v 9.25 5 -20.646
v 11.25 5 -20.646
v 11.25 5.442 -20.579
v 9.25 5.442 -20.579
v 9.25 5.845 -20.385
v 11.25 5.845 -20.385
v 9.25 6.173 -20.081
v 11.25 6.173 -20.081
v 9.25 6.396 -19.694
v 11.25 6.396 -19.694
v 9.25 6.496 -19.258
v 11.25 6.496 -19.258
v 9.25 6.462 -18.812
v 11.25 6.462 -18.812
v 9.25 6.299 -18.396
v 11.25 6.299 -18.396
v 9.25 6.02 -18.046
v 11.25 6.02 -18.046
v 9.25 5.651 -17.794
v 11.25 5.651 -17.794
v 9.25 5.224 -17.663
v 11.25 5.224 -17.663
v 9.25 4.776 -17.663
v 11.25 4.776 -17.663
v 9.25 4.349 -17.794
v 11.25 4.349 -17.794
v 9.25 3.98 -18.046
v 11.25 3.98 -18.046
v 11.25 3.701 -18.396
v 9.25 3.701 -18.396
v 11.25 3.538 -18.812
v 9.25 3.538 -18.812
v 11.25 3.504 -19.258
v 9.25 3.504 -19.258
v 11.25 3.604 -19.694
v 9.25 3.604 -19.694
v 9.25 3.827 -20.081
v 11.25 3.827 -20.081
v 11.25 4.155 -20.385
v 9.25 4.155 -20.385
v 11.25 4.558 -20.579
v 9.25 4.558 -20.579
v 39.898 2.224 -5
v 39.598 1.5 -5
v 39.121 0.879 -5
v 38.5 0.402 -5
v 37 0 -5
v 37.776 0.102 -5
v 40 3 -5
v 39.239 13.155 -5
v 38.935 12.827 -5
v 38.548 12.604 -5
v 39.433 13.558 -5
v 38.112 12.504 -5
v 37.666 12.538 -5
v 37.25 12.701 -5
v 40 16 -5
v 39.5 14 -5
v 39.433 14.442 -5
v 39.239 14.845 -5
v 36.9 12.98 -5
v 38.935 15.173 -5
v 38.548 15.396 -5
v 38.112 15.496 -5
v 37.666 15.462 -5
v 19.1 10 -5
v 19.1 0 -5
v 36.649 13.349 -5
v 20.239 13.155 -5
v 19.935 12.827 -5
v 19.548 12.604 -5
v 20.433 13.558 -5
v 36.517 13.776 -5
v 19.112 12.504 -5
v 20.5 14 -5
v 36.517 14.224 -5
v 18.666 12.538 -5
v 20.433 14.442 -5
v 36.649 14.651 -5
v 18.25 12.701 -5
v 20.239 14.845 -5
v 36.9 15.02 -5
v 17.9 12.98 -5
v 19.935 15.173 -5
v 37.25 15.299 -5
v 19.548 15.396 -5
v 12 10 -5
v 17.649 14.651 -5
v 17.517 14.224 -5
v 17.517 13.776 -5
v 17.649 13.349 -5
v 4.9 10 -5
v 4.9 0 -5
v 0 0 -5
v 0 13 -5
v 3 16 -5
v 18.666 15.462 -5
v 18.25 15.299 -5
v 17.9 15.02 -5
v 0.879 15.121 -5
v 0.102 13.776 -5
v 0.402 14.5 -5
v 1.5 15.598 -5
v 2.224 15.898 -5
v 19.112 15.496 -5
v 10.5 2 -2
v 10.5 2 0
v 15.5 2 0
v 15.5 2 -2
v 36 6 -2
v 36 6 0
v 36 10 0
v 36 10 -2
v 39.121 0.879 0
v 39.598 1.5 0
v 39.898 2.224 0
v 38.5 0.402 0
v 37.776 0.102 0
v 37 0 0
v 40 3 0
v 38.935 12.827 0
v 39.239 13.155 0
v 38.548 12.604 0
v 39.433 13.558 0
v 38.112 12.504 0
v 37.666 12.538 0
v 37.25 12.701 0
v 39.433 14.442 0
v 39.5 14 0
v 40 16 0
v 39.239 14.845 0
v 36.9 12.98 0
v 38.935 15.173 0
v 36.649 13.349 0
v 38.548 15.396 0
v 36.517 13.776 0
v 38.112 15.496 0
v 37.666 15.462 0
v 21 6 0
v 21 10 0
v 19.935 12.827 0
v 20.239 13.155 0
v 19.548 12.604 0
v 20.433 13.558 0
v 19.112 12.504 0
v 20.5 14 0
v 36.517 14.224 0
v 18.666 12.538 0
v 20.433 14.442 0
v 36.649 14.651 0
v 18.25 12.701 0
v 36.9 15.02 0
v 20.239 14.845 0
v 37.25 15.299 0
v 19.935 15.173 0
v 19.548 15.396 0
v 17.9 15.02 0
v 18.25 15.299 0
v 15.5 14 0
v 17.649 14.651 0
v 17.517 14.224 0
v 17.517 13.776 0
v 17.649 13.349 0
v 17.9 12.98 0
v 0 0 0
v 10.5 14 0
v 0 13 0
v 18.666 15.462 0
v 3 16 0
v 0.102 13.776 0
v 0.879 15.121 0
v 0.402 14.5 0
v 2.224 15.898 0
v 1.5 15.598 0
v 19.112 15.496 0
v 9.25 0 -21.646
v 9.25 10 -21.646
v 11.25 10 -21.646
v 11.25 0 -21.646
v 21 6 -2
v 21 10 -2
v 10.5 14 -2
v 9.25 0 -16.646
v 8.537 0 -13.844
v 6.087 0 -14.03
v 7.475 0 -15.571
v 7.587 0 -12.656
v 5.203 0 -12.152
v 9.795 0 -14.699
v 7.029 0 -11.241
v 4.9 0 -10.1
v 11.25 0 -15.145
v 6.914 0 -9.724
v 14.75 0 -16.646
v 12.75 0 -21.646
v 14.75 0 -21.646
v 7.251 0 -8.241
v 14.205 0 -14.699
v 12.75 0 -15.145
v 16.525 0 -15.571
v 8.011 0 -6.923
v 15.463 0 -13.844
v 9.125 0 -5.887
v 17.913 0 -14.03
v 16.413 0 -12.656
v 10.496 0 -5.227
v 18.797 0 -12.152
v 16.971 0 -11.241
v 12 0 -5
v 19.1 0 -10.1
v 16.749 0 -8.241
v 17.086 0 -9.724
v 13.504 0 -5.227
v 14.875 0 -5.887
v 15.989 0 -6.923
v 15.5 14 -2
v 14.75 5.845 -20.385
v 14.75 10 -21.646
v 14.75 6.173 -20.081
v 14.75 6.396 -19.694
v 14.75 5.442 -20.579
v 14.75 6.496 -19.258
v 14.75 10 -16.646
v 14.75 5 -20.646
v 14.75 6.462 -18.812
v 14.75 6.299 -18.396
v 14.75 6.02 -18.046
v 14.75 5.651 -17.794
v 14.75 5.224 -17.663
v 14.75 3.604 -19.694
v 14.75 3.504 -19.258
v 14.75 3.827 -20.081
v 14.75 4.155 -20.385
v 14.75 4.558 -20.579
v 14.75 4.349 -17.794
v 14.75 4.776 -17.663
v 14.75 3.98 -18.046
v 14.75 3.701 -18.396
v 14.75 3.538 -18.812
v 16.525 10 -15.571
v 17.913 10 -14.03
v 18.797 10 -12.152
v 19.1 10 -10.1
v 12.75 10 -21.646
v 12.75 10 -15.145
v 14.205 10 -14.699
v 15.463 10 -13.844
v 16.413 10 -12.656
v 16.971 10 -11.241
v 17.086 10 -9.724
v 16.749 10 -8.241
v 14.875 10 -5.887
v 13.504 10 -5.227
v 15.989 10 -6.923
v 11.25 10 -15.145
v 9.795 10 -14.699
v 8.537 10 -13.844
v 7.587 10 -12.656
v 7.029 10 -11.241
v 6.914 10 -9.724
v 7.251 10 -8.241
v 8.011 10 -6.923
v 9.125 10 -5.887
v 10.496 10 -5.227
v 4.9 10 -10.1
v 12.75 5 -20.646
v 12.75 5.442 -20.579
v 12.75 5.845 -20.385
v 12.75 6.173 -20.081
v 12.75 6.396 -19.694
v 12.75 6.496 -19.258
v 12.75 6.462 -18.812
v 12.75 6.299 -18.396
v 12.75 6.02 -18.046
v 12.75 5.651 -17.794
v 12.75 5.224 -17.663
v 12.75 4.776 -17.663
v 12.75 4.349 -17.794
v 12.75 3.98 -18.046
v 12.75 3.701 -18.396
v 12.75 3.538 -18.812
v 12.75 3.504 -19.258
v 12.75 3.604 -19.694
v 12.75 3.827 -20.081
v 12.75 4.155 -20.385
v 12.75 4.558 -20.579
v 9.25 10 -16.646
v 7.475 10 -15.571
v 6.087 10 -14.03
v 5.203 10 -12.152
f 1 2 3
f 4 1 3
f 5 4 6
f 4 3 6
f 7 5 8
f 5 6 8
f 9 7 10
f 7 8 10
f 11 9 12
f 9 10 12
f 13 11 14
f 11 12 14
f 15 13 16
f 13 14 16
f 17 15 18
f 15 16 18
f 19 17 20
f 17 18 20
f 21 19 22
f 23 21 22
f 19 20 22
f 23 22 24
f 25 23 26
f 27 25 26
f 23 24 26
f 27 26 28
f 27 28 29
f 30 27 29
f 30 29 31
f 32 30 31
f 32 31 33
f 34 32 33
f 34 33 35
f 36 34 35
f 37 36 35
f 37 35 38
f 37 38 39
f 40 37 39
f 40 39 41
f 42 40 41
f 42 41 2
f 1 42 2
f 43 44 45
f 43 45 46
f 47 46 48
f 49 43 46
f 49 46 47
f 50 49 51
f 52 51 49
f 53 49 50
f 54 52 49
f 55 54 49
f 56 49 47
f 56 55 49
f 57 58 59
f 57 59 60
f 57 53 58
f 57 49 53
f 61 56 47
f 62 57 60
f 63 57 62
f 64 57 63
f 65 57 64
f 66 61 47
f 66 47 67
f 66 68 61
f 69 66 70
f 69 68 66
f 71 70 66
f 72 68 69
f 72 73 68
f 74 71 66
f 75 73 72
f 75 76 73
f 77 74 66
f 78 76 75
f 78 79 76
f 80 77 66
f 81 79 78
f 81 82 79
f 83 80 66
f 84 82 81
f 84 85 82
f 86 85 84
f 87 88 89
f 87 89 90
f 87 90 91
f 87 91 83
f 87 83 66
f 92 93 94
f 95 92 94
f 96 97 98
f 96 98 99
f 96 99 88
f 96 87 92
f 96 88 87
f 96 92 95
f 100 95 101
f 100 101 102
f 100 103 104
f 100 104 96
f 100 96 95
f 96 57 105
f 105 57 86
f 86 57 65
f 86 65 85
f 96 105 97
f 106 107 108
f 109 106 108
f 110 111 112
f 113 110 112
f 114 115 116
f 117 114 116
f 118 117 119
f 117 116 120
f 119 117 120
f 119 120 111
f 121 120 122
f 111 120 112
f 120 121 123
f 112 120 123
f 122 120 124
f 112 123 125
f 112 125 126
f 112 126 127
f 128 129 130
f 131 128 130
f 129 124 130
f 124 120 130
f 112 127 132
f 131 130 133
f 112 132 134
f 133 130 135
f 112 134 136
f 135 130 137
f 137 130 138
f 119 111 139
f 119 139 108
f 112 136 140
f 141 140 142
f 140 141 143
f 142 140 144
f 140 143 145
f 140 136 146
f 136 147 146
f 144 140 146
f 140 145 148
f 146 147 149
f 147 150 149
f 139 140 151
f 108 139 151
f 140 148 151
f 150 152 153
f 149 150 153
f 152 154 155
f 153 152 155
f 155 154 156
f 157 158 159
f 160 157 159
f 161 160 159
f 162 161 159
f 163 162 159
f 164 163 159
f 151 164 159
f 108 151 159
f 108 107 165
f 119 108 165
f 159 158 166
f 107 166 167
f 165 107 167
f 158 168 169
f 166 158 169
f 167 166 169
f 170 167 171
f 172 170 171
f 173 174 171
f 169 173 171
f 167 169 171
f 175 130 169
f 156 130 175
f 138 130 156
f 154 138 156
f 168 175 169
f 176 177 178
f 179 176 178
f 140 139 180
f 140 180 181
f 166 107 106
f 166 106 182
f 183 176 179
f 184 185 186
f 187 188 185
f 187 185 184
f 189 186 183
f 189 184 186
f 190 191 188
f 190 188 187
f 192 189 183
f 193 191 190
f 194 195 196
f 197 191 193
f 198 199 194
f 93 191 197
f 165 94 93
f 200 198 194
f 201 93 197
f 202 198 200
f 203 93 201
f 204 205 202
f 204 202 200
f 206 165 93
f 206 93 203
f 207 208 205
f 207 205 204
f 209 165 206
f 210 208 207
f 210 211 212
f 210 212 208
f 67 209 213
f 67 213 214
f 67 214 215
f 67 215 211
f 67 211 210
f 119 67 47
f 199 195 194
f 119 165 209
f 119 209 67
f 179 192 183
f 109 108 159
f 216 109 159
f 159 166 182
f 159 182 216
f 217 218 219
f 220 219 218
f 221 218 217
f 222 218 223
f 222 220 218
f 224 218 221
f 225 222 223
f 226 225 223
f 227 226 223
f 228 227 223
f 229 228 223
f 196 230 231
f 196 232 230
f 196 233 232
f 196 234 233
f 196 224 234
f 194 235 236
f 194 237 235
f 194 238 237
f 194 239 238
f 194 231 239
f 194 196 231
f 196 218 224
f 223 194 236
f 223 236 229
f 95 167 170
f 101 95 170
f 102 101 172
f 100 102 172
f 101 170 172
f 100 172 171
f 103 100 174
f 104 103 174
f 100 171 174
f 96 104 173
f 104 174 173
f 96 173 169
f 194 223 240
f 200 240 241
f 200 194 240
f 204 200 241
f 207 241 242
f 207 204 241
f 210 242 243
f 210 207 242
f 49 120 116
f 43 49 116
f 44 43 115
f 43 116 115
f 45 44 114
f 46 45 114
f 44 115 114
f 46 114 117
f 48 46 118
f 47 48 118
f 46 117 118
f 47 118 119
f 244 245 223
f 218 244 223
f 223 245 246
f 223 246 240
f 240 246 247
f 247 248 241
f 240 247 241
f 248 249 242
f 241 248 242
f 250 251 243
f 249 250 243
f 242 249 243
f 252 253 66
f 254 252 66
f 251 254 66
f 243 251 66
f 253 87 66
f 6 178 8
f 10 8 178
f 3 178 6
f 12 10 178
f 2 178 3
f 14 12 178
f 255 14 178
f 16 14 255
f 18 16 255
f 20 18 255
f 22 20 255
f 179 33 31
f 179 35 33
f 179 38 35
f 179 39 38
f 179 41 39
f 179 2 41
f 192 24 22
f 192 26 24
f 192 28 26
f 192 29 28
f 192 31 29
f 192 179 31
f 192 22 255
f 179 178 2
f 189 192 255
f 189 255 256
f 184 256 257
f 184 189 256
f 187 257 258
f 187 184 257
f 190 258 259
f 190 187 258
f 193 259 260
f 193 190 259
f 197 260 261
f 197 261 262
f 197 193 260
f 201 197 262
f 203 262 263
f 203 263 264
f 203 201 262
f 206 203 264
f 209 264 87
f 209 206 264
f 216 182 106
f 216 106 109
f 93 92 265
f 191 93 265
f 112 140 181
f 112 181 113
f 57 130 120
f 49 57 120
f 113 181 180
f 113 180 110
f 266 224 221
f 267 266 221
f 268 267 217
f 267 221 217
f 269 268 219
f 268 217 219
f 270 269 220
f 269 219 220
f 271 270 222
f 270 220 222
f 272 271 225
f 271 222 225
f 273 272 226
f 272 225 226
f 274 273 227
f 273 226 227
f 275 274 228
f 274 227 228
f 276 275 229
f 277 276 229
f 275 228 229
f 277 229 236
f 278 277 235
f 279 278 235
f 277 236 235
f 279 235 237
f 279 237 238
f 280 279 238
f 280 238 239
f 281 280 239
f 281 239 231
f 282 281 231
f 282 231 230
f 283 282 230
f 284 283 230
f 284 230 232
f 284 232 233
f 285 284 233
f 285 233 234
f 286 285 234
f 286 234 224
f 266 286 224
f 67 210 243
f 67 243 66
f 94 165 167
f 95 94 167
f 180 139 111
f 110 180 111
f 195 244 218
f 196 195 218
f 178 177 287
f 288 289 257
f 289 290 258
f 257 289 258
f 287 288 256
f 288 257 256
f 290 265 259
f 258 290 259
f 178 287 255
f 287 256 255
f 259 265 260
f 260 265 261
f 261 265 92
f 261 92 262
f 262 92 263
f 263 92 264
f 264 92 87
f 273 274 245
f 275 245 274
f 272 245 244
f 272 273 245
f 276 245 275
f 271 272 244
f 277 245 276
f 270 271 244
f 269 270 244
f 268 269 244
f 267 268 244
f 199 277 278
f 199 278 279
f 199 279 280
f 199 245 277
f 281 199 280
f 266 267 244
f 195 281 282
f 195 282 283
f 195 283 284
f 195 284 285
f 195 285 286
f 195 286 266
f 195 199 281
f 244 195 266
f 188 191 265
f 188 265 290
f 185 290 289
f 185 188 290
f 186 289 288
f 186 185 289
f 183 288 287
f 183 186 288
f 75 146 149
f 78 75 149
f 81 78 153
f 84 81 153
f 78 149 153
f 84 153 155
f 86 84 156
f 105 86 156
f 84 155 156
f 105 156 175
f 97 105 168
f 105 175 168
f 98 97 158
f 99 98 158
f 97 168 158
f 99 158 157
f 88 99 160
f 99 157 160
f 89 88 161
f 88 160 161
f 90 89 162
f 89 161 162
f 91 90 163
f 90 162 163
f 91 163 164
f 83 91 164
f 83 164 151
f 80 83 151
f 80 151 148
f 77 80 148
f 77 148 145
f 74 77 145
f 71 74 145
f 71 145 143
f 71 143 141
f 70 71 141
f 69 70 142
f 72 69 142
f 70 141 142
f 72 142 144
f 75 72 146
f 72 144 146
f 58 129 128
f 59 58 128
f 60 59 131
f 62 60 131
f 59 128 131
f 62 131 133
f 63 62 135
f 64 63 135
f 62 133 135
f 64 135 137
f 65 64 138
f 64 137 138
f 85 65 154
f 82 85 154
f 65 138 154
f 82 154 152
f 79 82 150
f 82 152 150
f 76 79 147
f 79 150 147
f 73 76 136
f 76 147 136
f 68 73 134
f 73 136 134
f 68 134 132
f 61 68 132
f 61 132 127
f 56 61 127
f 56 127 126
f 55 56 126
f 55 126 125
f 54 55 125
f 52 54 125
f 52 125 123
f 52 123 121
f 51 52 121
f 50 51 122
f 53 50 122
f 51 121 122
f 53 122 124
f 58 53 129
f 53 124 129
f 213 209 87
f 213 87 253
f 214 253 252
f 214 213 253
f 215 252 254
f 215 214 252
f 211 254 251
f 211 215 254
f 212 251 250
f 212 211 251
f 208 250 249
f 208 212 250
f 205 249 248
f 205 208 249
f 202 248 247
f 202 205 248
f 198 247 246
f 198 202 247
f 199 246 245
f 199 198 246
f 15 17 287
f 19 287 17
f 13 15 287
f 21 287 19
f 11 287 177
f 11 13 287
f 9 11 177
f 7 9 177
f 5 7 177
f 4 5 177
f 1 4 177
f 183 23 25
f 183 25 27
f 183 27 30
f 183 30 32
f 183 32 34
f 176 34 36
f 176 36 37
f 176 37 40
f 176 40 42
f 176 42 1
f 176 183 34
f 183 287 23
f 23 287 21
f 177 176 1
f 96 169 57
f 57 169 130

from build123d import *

# Parameters (mm, degrees)
ESBO_O1_R                = 1.5
RESSALTO_EXTRUS_O1_DEPTH = 5
ESBO_O1_3_W              = 5
ESBO_O1_3_H              = 12
ESBO_O1_3_W_2            = 15
ESBO_O1_3_H_2            = 4
CORTE_EXTRUS_O1_DEPTH    = 2
RESSALTO_EXTRUS_O2_DEPTH = 10
ESBO_O3_R                = 1.5
CORTE_EXTRUS_O2_DEPTH    = 10


with BuildPart() as part:
    # Esboço1 → Ressalto-extrusão1 (new body)
    with BuildSketch(Plane.XY):
        with BuildLine():
            Line((40, 16), (3, 16))
            ThreePointArc((3, 16), (0.878679656, 15.121320344), (0, 13))
            Line((0, 13), (0, 0))
            Line((0, 0), (37, 0))
            ThreePointArc((37, 0), (39.121320344, 0.878679656), (40, 3))
            Line((40, 3), (40, 16))
        make_face()
        with Locations((19, 14)):
            Circle(ESBO_O1_R, mode=Mode.SUBTRACT)
        with Locations((38, 14)):
            Circle(ESBO_O1_R, mode=Mode.SUBTRACT)
    extrude(amount=-RESSALTO_EXTRUS_O1_DEPTH)

    # Esboço1<3> → Corte-extrusão1 (cut)
    with BuildSketch(Plane.XY):
        with Locations((13, 8)):
            Rectangle(ESBO_O1_3_W, ESBO_O1_3_H)
        with Locations((28.5, 8)):
            Rectangle(ESBO_O1_3_W_2, ESBO_O1_3_H_2)
    extrude(amount=-CORTE_EXTRUS_O1_DEPTH, mode=Mode.SUBTRACT)

    # Esboço2 → Ressalto-extrusão2 (add)
    with BuildSketch(Plane.XZ):
        with BuildLine():
            Line((19.1, -5), (12.000000019, -5))
            ThreePointArc((12.000000019, -5), (17.086118989, -9.723976561), (12.75, -15.144551516))
            Line((12.75, -15.144551516), (12.75, -21.64580018))
            Line((12.75, -21.64580018), (14.75, -21.64580018))
            Line((14.75, -21.64580018), (14.75, -16.64580018))
            ThreePointArc((14.75, -16.64580018), (17.913332394, -14.029694645), (19.1, -10.1))
            Line((19.1, -10.1), (19.1, -5))
        make_face()
        with BuildLine():
            Line((12.000000019, -5), (4.9, -5))
            Line((4.9, -5), (4.9, -10.1))
            ThreePointArc((4.9, -10.1), (6.086667606, -14.029694645), (9.25, -16.64580018))
            Line((9.25, -16.64580018), (9.25, -21.64580018))
            Line((9.25, -21.64580018), (11.25, -21.64580018))
            Line((11.25, -21.64580018), (11.25, -15.144551516))
            ThreePointArc((11.25, -15.144551516), (6.913881012, -9.723976542), (12.000000019, -5))
        make_face()
    extrude(amount=-RESSALTO_EXTRUS_O2_DEPTH)

    # Esboço3 → Corte-extrusão2 (cut)
    with BuildSketch(Plane(origin=(14.75, 0, 0), x_dir=(0, 0, -1), z_dir=(1, 0, 0))):
        with Locations((19.14580018, 5)):
            Circle(ESBO_O3_R)
    extrude(amount=-CORTE_EXTRUS_O2_DEPTH, mode=Mode.SUBTRACT)


solid = part.part
